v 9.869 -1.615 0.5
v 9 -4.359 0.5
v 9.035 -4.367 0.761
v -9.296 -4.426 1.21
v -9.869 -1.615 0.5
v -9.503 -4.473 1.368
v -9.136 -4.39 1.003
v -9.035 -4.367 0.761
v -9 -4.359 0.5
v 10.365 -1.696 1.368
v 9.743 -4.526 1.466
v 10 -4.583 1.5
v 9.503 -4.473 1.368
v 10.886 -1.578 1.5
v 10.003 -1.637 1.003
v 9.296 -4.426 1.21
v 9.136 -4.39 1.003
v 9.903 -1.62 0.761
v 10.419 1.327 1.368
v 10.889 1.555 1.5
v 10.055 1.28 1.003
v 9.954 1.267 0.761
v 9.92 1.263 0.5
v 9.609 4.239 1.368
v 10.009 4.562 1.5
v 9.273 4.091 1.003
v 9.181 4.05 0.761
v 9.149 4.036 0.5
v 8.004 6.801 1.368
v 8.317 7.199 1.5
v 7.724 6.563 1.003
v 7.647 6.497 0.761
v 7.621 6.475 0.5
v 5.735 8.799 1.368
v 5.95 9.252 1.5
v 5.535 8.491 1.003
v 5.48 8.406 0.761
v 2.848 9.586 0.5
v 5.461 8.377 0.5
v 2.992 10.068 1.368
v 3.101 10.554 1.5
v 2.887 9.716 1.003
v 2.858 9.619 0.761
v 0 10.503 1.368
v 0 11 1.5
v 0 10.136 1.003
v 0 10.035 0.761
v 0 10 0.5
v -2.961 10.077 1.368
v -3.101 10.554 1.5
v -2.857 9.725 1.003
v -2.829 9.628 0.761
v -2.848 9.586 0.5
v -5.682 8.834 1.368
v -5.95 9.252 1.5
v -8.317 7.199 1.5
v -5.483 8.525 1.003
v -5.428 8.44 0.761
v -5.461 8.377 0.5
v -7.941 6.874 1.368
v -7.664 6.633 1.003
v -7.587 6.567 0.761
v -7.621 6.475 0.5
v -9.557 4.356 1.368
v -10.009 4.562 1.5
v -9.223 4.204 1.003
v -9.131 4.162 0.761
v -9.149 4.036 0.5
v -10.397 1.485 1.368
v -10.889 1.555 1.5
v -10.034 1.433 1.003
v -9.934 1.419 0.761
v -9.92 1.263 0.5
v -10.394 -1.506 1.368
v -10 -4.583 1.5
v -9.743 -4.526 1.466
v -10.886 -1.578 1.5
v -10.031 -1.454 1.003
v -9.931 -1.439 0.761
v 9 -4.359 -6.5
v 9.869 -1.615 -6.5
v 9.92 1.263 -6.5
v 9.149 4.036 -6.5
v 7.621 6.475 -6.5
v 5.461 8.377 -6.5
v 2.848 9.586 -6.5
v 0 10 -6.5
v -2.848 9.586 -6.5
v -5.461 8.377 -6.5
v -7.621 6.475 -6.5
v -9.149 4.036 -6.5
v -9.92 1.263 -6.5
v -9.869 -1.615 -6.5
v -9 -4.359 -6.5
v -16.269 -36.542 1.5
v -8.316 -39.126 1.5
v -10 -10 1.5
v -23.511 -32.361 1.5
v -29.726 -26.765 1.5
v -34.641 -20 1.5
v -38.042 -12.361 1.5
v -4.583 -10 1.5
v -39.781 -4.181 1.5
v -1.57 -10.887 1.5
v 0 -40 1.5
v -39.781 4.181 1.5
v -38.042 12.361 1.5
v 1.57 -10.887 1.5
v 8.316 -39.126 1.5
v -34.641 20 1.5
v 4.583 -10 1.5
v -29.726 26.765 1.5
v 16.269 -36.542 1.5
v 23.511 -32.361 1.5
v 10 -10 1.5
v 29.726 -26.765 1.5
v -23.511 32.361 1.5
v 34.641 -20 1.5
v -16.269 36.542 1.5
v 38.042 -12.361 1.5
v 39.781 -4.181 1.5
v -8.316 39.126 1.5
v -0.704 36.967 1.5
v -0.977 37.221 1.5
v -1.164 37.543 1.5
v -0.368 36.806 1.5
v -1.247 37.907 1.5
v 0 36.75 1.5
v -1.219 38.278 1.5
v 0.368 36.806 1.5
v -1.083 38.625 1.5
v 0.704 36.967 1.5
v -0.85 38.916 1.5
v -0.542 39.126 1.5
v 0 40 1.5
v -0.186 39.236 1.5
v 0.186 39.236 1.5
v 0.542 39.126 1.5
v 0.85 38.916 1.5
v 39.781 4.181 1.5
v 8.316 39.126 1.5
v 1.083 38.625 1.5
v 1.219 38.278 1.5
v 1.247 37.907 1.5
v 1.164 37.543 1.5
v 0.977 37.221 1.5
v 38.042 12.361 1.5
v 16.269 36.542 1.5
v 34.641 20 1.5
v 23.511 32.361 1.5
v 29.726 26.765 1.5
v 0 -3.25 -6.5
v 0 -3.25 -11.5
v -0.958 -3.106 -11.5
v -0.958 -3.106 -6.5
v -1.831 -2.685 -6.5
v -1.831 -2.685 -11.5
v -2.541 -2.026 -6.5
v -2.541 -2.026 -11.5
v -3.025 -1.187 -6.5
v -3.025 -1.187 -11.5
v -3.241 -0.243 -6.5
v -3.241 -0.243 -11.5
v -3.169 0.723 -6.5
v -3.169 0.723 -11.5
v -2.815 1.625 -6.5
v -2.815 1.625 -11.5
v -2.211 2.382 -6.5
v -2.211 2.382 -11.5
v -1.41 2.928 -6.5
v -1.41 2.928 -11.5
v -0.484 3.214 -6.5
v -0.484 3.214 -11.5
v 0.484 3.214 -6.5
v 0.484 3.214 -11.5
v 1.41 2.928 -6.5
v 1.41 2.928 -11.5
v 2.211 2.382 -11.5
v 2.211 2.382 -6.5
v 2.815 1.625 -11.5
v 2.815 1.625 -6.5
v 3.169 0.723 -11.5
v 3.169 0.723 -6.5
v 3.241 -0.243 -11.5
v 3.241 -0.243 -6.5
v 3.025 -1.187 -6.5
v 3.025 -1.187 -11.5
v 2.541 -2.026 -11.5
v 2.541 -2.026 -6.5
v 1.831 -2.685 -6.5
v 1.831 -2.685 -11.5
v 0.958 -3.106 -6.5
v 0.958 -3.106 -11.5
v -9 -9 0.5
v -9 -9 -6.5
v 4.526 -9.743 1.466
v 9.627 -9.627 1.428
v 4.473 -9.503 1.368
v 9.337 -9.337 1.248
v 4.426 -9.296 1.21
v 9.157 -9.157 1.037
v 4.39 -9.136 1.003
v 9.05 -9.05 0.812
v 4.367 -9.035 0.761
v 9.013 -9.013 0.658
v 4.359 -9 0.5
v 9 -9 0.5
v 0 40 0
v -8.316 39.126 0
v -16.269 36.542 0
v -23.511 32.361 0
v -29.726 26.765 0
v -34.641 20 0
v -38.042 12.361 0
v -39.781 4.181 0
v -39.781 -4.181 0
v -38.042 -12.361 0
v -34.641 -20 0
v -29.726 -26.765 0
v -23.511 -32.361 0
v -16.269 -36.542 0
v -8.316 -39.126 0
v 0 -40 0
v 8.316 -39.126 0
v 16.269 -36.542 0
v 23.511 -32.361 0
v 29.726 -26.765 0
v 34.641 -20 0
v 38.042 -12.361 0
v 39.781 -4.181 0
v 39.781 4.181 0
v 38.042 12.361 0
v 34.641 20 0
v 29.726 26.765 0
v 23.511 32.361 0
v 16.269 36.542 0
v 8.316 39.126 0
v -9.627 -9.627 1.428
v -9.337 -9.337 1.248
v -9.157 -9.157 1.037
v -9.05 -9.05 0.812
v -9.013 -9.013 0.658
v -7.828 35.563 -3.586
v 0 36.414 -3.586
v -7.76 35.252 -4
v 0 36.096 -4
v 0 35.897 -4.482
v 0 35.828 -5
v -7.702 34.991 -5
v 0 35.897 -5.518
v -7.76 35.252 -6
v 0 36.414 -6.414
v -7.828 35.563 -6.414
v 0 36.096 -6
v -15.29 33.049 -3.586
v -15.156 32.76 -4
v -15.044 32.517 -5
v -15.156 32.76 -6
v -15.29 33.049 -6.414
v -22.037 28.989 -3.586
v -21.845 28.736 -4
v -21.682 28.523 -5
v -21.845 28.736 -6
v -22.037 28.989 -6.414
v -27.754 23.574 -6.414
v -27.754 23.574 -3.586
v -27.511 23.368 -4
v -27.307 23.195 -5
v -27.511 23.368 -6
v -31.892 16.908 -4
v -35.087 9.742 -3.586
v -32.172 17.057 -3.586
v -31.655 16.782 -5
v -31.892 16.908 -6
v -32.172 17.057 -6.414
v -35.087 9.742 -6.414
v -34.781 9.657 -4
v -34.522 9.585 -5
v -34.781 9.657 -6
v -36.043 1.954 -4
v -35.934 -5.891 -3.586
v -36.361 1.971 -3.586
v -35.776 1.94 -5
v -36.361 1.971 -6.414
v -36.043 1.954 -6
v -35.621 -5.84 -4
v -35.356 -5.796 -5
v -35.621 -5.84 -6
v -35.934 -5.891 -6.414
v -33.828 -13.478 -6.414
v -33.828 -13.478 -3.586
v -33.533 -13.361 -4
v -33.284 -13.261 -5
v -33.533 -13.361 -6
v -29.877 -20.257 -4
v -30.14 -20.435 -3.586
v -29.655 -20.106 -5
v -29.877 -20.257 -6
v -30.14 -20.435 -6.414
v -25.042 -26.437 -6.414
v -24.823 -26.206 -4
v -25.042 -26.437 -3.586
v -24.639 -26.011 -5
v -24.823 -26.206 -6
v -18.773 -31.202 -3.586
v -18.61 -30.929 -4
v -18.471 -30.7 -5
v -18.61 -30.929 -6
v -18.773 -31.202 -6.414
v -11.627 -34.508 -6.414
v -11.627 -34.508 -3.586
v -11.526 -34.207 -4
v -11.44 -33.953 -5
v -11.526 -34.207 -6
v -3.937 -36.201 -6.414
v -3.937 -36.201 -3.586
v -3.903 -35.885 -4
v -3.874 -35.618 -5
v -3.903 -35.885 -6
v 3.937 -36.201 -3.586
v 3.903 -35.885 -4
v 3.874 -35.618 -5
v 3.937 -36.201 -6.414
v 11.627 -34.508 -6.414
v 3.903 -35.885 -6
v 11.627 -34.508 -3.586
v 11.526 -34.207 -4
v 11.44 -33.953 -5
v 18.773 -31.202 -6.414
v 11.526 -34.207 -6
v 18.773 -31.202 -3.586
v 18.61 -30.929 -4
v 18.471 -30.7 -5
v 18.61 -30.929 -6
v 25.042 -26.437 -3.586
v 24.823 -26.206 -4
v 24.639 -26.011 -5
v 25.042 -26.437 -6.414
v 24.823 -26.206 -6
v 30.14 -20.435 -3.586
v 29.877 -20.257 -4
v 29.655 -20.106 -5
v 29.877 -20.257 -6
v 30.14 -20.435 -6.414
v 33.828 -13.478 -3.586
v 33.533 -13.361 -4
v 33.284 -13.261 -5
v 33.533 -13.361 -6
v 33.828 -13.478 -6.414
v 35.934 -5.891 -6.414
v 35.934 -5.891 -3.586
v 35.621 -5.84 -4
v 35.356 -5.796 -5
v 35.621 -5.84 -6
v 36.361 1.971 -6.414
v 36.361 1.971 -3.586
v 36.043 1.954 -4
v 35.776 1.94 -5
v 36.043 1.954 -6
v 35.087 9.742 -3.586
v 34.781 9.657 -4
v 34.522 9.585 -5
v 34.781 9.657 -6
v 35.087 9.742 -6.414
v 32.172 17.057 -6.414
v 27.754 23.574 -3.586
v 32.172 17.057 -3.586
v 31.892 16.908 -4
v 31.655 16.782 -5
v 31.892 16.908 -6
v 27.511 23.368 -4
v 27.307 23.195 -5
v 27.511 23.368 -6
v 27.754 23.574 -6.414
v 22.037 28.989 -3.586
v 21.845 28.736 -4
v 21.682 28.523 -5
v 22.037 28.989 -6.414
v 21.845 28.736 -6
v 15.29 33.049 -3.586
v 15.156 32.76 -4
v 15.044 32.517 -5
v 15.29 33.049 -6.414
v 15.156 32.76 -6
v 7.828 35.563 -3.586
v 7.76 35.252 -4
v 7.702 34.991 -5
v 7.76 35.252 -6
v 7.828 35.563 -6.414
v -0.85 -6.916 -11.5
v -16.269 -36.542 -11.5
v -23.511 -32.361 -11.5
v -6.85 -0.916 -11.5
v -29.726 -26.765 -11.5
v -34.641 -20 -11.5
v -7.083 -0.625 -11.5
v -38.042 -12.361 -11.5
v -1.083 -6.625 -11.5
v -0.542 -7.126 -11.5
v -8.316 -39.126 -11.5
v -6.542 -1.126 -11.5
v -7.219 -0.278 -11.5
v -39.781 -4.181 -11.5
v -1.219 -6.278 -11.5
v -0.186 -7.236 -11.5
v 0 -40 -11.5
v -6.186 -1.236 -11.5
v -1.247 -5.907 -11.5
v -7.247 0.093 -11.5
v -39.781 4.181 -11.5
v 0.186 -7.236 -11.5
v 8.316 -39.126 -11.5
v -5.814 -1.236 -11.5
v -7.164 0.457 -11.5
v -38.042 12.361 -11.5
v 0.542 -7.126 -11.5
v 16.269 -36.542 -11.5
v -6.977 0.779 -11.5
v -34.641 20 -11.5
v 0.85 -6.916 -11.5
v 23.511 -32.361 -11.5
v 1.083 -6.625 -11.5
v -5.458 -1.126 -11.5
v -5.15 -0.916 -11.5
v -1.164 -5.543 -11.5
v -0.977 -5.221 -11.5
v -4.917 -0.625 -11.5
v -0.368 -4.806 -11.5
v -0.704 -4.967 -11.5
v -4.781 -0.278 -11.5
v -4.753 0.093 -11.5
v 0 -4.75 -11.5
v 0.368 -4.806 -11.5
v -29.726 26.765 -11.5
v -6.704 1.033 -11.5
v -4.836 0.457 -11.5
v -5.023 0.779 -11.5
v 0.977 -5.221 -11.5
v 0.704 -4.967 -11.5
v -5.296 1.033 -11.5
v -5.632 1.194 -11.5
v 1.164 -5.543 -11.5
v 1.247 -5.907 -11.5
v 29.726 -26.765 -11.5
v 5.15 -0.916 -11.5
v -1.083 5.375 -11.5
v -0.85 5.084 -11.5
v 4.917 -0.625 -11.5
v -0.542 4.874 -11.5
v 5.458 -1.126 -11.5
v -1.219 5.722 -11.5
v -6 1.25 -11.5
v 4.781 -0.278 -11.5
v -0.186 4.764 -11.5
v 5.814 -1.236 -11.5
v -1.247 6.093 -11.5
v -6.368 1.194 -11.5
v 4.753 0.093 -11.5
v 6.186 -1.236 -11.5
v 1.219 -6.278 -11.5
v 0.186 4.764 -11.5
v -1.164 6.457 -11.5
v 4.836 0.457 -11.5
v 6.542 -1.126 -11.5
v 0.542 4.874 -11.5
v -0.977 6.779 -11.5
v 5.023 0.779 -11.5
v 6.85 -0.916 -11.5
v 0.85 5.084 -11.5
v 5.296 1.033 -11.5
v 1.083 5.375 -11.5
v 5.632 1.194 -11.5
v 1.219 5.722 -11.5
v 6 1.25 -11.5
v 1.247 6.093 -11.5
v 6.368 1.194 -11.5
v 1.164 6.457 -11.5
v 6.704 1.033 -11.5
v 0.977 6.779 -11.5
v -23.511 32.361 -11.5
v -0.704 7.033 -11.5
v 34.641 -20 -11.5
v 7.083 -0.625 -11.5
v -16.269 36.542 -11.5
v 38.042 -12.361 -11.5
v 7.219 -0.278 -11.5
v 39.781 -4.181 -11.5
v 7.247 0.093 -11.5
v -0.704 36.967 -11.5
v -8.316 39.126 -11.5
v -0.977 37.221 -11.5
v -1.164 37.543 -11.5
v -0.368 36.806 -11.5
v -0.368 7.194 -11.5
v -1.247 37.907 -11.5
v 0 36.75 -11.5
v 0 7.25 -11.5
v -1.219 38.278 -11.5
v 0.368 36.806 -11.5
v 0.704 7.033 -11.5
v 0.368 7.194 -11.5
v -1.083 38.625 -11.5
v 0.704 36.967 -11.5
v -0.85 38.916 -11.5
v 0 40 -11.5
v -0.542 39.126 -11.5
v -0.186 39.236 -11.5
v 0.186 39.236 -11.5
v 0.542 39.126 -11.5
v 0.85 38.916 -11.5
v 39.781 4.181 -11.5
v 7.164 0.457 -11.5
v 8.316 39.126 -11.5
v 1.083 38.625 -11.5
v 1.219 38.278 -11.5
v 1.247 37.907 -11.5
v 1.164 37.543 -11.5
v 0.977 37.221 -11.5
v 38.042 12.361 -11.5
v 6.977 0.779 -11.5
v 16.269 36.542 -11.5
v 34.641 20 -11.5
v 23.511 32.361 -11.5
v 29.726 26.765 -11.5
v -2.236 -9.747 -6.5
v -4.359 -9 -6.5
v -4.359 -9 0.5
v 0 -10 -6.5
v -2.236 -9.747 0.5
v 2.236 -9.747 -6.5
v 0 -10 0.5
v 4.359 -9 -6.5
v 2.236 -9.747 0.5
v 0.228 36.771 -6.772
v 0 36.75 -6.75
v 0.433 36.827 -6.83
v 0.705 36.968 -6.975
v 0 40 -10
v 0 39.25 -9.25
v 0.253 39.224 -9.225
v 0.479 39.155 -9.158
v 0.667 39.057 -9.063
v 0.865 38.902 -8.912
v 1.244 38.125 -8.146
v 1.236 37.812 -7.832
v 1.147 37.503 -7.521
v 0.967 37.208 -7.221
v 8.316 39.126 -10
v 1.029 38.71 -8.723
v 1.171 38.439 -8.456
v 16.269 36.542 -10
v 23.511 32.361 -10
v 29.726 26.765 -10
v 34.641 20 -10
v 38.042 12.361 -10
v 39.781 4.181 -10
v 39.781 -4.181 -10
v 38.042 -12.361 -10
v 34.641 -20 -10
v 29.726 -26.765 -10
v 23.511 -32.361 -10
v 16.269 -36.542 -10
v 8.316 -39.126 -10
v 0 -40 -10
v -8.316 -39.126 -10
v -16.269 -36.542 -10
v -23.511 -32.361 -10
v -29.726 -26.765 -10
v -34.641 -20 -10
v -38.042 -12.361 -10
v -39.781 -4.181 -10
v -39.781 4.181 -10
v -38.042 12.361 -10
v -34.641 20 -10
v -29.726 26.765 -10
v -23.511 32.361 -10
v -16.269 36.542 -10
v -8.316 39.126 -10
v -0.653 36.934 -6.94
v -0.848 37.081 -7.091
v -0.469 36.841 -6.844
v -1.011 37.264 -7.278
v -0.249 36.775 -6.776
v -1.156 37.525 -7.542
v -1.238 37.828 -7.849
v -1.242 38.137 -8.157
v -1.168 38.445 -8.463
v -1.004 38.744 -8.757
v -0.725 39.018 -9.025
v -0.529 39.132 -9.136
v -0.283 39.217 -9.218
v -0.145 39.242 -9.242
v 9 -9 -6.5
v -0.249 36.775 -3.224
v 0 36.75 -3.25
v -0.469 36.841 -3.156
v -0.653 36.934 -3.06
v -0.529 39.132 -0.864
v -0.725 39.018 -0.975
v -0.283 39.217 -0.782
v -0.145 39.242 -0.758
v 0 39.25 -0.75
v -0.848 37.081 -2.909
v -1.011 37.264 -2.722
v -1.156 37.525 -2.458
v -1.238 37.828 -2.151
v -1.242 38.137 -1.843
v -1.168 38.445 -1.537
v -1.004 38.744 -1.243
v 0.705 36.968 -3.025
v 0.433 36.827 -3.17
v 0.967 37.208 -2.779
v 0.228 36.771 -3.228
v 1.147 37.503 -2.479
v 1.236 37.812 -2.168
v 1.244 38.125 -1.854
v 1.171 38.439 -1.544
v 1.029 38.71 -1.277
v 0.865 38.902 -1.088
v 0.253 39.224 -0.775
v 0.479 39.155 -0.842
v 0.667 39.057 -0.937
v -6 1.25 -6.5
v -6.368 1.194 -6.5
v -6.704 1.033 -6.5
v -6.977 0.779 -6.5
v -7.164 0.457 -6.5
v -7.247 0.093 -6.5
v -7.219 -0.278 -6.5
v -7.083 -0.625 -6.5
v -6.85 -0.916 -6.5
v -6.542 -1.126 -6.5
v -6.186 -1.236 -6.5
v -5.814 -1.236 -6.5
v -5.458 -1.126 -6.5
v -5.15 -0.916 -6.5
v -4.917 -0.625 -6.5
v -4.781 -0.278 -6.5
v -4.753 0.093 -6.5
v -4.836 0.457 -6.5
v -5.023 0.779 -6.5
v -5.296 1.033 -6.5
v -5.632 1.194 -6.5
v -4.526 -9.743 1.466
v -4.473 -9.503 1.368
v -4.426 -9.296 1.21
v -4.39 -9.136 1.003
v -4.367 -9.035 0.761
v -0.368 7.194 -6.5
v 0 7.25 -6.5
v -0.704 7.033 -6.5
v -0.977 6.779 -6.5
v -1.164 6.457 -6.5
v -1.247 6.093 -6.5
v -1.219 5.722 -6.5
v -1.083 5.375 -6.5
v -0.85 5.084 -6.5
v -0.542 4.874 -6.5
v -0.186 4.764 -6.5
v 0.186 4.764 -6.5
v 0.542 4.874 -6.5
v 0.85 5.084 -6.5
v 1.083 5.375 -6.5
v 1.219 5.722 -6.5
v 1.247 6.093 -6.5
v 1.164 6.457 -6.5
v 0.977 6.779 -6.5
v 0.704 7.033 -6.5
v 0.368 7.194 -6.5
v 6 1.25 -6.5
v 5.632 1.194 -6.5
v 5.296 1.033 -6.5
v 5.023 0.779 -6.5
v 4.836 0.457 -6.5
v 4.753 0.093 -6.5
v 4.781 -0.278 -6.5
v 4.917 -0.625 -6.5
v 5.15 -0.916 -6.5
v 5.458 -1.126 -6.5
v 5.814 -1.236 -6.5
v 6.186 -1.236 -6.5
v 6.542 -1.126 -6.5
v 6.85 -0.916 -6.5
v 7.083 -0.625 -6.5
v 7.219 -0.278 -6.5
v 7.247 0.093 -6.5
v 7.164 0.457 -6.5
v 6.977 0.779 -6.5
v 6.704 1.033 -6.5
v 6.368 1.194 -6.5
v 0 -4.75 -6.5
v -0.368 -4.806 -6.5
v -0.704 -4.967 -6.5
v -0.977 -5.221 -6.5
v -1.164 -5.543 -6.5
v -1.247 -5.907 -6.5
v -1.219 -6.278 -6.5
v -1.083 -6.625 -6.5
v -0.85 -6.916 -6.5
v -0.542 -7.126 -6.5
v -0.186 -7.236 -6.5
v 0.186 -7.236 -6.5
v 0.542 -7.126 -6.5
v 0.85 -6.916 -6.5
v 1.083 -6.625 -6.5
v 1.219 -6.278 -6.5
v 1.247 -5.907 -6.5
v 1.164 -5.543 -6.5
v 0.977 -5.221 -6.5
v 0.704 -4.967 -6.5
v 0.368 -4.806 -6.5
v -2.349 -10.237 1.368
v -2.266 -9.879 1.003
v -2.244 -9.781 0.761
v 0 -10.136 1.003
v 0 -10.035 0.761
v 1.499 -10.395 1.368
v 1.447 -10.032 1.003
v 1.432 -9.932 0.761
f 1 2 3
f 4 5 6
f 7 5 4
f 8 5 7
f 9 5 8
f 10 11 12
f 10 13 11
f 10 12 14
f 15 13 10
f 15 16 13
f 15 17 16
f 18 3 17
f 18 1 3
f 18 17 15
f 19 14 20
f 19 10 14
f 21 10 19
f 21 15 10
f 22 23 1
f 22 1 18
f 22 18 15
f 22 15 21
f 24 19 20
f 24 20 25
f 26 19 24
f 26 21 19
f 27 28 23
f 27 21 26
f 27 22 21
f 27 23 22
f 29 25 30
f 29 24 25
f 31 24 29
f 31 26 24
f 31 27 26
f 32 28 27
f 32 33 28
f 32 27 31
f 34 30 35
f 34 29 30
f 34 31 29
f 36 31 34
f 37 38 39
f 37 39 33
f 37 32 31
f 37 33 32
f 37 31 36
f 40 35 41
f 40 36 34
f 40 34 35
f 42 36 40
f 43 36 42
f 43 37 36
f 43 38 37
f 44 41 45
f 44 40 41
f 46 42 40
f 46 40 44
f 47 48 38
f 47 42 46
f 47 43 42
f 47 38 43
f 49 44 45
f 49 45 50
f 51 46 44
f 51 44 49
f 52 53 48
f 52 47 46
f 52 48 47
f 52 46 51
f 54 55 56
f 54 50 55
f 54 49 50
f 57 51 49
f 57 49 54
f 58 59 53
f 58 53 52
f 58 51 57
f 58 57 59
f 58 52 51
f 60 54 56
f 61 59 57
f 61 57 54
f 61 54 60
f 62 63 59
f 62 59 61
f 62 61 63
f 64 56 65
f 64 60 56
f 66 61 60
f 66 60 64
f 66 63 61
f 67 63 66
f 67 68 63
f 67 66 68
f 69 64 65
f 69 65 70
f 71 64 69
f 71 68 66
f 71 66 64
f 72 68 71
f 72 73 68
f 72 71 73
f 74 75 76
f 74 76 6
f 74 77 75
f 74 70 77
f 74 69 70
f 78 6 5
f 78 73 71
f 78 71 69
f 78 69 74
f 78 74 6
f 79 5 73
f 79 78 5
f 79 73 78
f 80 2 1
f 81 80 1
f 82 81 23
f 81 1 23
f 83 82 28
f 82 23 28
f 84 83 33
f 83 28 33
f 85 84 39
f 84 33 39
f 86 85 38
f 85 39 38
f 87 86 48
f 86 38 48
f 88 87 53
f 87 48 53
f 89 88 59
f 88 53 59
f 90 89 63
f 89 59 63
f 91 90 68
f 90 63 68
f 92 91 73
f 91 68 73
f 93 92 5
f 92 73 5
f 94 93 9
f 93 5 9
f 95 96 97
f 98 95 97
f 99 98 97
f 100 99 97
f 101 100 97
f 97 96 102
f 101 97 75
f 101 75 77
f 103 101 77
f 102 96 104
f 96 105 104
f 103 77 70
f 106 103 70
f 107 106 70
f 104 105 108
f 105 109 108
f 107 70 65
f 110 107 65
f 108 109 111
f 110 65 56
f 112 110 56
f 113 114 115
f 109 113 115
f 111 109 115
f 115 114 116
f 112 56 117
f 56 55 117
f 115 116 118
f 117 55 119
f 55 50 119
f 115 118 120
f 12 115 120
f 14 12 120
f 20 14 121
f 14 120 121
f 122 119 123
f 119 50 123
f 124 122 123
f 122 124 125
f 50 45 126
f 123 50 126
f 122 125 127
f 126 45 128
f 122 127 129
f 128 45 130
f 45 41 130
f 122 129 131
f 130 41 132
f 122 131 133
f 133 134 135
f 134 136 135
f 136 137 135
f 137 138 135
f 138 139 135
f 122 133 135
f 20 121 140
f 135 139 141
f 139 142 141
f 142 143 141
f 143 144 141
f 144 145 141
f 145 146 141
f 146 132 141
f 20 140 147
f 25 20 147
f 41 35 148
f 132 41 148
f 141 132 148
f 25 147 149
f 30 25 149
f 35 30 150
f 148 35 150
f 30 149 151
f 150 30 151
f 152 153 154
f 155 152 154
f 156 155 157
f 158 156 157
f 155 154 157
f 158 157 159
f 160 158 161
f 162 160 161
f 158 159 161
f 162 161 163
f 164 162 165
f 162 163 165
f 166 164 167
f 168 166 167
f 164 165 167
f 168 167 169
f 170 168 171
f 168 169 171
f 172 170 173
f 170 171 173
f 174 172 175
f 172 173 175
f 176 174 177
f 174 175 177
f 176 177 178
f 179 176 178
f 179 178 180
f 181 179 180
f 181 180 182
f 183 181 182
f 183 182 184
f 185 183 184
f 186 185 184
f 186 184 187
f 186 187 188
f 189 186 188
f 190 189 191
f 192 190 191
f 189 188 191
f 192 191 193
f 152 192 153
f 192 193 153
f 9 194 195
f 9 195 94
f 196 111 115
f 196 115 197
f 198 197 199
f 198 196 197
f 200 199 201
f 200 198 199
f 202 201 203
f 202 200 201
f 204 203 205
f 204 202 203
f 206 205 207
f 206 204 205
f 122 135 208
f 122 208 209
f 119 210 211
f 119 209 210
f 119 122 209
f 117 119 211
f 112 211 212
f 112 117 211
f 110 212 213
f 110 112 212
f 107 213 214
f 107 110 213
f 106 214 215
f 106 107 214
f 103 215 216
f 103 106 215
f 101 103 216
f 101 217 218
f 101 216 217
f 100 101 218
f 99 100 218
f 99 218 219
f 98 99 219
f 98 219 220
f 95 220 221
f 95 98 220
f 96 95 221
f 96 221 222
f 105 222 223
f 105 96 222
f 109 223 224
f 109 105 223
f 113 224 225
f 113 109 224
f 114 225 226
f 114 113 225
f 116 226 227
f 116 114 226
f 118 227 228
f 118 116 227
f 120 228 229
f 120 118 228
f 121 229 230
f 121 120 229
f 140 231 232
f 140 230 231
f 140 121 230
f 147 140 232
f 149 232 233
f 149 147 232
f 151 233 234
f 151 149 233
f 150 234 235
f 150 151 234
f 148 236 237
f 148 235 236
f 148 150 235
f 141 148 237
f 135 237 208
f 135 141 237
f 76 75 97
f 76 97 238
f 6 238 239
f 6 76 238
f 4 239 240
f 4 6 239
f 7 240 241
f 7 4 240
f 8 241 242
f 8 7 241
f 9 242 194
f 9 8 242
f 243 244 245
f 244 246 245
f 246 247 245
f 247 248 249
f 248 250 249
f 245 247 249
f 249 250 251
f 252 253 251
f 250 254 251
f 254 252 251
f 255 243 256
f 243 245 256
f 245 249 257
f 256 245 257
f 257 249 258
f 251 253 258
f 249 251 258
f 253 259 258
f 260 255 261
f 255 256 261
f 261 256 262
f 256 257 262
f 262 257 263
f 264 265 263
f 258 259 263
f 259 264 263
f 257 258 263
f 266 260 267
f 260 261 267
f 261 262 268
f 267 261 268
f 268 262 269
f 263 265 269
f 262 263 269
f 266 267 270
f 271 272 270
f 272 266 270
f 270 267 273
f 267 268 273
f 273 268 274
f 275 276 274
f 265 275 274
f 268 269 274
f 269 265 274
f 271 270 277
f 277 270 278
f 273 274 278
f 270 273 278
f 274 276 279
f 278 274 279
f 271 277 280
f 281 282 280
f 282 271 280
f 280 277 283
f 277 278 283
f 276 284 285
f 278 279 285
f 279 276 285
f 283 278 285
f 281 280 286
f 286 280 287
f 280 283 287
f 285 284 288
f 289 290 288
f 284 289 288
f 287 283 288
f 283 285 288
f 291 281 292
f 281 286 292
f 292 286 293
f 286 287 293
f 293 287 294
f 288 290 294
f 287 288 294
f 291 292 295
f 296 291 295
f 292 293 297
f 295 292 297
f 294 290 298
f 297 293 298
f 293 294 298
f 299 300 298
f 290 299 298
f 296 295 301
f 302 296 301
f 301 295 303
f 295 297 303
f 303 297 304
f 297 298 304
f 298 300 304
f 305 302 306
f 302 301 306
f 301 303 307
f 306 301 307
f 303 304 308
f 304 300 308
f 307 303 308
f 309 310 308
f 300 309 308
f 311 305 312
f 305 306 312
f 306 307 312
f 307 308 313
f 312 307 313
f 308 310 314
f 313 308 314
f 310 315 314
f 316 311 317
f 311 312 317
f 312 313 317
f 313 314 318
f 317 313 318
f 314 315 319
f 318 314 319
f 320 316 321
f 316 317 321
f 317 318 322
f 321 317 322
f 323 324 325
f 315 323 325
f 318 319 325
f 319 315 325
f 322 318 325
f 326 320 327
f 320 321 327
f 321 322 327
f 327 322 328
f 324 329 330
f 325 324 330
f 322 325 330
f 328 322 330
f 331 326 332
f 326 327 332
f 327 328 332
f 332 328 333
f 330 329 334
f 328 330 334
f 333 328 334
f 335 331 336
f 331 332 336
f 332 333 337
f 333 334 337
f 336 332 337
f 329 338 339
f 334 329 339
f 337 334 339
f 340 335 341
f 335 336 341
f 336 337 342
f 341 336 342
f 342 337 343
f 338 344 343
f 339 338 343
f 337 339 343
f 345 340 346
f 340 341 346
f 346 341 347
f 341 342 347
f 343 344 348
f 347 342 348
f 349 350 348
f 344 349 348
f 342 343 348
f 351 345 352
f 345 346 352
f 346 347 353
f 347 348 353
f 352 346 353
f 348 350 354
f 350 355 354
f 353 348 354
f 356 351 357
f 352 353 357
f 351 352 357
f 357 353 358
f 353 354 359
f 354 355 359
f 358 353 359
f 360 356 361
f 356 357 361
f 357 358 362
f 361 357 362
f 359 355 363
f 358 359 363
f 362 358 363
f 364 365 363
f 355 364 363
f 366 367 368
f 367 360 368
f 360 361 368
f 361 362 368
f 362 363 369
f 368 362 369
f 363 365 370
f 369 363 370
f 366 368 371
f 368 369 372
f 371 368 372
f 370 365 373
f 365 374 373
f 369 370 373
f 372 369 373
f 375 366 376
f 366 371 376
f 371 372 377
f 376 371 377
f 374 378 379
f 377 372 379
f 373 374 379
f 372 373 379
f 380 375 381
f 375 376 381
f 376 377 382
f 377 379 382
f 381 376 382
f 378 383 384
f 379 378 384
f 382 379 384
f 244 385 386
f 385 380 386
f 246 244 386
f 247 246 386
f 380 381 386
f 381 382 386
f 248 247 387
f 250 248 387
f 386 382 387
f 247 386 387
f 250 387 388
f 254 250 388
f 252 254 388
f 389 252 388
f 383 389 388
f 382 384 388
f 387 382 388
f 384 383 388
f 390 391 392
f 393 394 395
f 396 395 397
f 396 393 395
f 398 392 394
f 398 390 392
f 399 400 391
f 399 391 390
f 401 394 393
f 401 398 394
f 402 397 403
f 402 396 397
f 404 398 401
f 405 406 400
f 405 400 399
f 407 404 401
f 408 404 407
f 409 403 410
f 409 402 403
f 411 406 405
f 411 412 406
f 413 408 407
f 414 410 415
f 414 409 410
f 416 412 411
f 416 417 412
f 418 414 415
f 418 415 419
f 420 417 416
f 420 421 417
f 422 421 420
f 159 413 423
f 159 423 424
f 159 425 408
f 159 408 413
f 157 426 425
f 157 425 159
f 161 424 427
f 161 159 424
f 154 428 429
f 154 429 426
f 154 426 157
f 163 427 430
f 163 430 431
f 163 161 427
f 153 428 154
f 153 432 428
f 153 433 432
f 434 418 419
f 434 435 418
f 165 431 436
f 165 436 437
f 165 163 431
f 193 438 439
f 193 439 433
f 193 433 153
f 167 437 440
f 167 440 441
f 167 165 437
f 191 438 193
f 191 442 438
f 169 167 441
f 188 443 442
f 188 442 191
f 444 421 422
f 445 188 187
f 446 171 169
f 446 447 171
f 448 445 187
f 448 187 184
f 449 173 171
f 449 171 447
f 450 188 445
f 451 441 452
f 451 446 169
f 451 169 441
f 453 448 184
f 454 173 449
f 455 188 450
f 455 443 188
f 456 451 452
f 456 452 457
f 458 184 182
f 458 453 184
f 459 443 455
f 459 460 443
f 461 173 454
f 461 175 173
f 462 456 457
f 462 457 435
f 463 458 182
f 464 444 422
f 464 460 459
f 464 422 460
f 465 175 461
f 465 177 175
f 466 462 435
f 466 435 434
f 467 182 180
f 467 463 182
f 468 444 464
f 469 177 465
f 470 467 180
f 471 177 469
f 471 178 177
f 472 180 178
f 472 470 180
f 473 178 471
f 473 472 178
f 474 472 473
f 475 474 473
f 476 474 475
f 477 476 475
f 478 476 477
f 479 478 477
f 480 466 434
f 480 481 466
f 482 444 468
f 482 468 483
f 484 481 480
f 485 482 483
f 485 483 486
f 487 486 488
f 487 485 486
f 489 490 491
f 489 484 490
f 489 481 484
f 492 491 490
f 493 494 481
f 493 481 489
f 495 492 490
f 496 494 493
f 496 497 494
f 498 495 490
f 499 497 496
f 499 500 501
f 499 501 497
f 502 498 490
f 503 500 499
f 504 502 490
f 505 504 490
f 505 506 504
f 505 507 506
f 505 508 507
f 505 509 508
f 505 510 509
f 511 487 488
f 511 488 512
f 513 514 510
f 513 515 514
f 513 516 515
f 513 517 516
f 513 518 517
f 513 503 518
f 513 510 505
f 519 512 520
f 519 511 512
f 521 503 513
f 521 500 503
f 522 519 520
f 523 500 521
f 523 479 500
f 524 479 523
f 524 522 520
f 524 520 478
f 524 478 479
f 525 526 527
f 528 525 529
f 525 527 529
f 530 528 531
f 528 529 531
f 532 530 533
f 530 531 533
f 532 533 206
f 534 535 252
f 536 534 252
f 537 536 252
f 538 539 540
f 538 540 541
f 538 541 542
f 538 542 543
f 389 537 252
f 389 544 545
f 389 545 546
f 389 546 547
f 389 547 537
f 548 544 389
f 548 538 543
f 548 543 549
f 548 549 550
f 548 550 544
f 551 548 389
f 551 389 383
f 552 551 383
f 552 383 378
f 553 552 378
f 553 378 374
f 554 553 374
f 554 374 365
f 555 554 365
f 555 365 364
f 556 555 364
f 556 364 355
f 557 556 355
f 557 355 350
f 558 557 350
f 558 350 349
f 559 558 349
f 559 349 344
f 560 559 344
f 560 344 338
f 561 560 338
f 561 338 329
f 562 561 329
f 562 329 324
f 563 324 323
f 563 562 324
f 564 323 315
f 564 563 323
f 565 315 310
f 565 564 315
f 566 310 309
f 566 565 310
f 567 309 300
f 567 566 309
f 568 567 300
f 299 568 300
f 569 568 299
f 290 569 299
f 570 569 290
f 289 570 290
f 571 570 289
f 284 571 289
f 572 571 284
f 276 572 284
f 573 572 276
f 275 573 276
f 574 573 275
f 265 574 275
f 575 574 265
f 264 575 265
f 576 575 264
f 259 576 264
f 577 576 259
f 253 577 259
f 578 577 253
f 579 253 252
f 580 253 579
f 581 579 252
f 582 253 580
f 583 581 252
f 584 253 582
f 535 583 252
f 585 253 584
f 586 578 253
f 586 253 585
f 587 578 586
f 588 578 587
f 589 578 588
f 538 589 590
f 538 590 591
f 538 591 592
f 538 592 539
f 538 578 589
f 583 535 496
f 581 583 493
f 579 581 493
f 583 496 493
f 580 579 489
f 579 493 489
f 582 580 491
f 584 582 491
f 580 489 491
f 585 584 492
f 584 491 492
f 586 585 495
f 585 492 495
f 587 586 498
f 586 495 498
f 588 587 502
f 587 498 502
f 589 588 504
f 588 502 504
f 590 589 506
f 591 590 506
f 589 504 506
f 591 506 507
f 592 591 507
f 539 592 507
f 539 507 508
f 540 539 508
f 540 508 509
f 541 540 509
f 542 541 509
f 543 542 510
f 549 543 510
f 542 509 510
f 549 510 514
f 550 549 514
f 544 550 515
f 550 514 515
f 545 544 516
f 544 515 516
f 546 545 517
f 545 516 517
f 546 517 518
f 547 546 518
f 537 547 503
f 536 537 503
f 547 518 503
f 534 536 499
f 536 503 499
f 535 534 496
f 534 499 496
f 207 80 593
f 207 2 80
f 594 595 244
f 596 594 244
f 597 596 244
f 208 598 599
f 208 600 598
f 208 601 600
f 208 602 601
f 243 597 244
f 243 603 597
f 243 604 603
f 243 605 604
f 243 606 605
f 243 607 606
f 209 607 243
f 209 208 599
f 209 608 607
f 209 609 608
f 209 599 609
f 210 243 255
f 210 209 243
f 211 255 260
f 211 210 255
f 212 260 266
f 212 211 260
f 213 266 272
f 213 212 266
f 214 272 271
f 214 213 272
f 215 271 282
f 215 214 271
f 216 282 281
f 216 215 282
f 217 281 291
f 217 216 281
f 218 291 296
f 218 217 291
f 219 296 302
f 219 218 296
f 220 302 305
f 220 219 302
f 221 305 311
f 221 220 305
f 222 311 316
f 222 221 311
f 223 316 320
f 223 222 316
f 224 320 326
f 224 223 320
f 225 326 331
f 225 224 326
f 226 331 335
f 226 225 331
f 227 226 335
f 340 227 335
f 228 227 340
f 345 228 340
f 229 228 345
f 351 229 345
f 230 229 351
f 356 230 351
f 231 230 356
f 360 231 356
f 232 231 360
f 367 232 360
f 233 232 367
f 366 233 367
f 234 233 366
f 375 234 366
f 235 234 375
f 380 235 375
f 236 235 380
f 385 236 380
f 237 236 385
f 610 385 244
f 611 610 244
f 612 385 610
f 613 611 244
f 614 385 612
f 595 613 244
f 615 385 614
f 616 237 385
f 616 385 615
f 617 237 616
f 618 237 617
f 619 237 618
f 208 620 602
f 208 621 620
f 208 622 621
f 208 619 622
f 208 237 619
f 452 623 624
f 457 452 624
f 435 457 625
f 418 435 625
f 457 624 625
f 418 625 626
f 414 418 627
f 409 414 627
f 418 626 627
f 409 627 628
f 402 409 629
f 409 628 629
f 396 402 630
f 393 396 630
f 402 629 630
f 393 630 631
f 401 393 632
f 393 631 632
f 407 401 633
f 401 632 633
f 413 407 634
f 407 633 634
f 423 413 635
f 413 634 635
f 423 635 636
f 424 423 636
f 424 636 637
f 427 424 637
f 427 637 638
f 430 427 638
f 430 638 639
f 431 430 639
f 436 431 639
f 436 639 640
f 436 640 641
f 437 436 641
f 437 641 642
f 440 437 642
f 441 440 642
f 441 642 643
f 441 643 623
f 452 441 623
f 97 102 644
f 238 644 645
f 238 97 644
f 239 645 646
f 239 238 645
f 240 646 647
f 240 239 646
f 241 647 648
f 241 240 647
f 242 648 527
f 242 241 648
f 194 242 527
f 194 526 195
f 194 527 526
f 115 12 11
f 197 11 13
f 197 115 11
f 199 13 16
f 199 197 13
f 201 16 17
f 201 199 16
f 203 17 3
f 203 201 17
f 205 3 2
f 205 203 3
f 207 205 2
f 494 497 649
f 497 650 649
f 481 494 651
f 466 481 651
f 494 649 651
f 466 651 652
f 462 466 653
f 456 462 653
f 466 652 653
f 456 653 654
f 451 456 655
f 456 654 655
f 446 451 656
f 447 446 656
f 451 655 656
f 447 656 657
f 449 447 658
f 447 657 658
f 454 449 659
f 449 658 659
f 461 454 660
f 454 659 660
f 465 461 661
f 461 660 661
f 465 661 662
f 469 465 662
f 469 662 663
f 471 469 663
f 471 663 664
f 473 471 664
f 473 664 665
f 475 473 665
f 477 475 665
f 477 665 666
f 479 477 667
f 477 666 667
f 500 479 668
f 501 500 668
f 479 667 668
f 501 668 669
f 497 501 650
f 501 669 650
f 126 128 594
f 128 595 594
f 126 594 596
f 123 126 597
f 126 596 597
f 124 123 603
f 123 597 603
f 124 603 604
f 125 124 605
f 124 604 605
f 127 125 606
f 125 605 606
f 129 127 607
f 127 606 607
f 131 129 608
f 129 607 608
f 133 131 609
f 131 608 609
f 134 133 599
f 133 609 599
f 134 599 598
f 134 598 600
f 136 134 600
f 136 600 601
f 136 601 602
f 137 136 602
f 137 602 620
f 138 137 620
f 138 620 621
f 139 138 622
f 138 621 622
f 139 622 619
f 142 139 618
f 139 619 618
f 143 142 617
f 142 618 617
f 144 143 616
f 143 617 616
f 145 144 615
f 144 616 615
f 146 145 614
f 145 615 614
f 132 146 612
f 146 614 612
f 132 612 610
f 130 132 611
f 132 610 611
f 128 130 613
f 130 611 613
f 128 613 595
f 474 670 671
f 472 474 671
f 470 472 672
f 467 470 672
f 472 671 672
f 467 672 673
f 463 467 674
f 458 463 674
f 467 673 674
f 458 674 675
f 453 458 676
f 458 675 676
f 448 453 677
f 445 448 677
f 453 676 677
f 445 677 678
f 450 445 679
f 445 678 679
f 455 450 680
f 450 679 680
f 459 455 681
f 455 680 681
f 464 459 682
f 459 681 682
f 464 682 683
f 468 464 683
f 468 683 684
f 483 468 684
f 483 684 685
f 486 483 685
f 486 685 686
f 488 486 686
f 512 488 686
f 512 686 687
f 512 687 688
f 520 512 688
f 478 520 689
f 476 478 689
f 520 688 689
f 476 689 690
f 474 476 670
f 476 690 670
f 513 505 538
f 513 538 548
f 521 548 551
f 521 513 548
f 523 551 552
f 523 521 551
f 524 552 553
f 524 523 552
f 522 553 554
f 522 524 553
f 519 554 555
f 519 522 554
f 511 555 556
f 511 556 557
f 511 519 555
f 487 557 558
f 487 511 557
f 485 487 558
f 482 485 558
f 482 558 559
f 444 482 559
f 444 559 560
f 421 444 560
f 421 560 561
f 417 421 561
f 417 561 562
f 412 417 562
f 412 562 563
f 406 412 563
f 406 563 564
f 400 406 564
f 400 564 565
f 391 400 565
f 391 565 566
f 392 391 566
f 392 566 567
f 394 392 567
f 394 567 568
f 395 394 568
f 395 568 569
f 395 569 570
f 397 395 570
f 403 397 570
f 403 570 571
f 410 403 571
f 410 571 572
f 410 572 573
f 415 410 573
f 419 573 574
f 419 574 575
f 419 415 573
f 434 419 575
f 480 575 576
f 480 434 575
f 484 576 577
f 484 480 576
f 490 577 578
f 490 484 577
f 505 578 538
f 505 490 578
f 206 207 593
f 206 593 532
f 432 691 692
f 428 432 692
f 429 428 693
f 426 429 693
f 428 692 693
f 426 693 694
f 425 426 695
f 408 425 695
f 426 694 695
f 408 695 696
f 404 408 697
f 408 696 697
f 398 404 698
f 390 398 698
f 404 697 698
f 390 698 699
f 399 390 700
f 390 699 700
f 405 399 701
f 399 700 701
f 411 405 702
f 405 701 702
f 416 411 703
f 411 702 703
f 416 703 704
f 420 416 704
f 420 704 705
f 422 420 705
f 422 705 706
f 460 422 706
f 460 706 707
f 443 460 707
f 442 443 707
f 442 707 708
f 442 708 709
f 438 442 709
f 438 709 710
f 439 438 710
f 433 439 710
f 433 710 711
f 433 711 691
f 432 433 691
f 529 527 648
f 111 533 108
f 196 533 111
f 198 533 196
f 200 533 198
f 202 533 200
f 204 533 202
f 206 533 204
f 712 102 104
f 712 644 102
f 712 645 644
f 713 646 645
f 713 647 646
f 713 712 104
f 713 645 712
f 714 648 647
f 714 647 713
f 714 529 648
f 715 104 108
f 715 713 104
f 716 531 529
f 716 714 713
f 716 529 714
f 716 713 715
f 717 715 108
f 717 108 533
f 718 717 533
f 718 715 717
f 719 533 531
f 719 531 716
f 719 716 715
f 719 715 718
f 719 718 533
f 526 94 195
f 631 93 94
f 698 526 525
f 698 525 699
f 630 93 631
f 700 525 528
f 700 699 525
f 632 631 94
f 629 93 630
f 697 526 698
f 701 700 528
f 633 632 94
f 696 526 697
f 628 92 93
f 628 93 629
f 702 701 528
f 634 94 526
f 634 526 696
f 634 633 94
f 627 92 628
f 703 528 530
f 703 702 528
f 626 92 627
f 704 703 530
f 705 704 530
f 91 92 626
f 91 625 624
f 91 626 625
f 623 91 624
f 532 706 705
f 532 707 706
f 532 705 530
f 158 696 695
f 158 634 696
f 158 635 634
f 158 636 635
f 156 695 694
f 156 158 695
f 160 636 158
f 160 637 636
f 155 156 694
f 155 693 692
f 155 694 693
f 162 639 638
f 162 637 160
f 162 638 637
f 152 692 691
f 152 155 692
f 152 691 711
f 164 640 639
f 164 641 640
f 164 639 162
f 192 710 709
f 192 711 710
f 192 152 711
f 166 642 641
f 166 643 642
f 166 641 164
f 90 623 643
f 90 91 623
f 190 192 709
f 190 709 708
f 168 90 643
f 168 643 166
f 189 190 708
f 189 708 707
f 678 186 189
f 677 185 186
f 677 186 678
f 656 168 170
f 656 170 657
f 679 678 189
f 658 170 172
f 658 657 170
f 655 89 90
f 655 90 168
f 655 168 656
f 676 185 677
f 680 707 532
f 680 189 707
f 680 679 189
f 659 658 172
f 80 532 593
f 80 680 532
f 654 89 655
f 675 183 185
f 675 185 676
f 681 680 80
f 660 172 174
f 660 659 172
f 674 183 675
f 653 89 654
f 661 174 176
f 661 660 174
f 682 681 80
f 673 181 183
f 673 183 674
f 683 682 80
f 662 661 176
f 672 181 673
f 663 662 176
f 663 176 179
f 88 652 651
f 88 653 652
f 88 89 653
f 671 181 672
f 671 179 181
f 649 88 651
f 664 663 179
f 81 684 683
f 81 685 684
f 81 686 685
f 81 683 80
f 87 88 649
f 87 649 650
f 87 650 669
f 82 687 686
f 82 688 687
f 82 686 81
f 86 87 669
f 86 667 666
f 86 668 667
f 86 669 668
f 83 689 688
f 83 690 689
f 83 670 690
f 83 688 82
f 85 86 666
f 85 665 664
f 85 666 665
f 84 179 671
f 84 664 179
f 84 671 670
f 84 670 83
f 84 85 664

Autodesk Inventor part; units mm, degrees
ref_plane "YZ Plane" through (0, 0, 0) normal (1, 0, 0) x (0, 1, 0)
ref_plane "XZ Plane" through (0, 0, 0) normal (0, 1, 0) x (-1, 0, 0)
ref_plane "XY Plane" through (0, 0, 0) normal (0, 0, 1) x (1, 0, 0)
sketch "スケッチ1" plane through (0, 0, 0) normal (1, 0, 0) x (0, 1, 0)
  line L0 (0, 0) -> (0, -10)
  line L1 (0, 0) -> (40, 0)
  line L2 (0, -10) -> (40, -10)
  line L3 (40, 0) -> (30, -10)
  line L4 (40, -10) -> (30, 0)
  circle A0 centre (37.8284, -5) radius 2
  line L5 (0, 0) -> (40, 0)
  line L6 (40, 0) -> (40, 1.5)
  line L7 (40, 1.5) -> (0, 1.5)
  line L8 (0, 1.5) -> (0, 0)
  line L9 (0, -10) -> (40, -10)
  line L10 (40, -10) -> (40, -11.5)
  line L11 (40, -11.5) -> (0, -11.5)
  line L12 (0, -11.5) -> (0, -10)
  point P0 (36.4142, -6.4142)
  point P1 (36.4142, -3.5858)
  dimension "d0" = 10
  dimension "d1" = 40
  dimension "d2" = 40
  dimension "d3" = 45
  dimension "d4" = 45
  dimension "d5" = 2
  dimension "d6" = 2
  dimension "d7" = 1.5
  dimension "d8" = 1.5
  dimension "d41" = 40
revolve "回転1" add sketch "スケッチ1" angle 360 about axis through (0, 0, 0) along (0, 0, -1) contours L1 L4 L3 L2 L0 | L8 L7 L6 L1 | L2 L10 L11 L12 | L1 L3 L4 | L3 L4 L2 | L3 A0 L4
sketch "スケッチ2" plane through (0, 0, 1.5) normal (0, 0, 1) x (1, 0, 0)
  point P0 (0, 0)
  point P1 (0, 0)
hole "穴1" at (0, 0, 1.5) direction (0, 0, -1) diameter 6.5 end through all
sketch "スケッチ3" plane through (0, 0, 1.5) normal (0, 0, 1) x (1, 0, 0)
  circle A0 centre (0, 0) radius 10
  line L0 (-9, 0) -> (9, 0)
  line L1 (9, 0) -> (9, -9)
  line L2 (9, -9) -> (-9, -9)
  line L3 (-9, -9) -> (-9, 0)
  point P0 (0, 0)
  point P1 (4.3589, -9)
  point P2 (9, -4.3589)
  point P3 (-9, -4.3589)
  point P4 (-4.3589, -9)
  dimension "d17" = 20
  dimension "d36" = 18
  dimension "d37" = 9
  dimension "d38" = 9
  dimension "d39" = 0
extrude "押し出し1" cut sketch "スケッチ3" against normal blind 8
sketch "スケッチ4" plane through (0, 0, 1.5) normal (0, 0, 1) x (1, 0, 0)
  point P0 (0, 0)
sketch "スケッチ5" plane through (0, 0, -11.5) normal (0, 0, -1) x (-1, 0, 0)
  circle A0 centre (0, 0) radius 6
  point P0 (0, 0)
  point P1 (6, 0)
  point P2 (0, 6)
  point P3 (-6, 0)
  point P4 (0, -6)
  dimension "d20" = 12
  dimension "d23" = 360
hole "穴2" at (-6, 0, -11.5) at (0, 6, -11.5) at (6, 0, -11.5) at (0, -6, -11.5) direction (0, 0, 1) diameter 2.5 end through all
fillet "フィレット2" radius 1 6 edges at (0, 10, 1.5) (-9, -6.6794, 1.5) (-6.6794, -9, 1.5) (0, -10, 1.5) (6.6794, -9, 1.5) (9, -6.6794, 1.5)
sketch "スケッチ7" plane through (0, 0, 1.5) normal (0, 0, 1) x (1, 0, 0)
  circle A0 centre (0, 0) radius 40 projected
  point P0 (0, 38)
  dimension "d42" = 38
hole "穴3" at (0, 38, 1.5) direction (0, 0, -1) diameter 2.5 end through all
equation "\"d2\" = d1"
equation "\"d6\" = d5"
equation "\"d8\" = d7"
equation "\"d41\" = d1"
equation "\"d37\" = 0.5 * d36"
properties part number "s_base7"
